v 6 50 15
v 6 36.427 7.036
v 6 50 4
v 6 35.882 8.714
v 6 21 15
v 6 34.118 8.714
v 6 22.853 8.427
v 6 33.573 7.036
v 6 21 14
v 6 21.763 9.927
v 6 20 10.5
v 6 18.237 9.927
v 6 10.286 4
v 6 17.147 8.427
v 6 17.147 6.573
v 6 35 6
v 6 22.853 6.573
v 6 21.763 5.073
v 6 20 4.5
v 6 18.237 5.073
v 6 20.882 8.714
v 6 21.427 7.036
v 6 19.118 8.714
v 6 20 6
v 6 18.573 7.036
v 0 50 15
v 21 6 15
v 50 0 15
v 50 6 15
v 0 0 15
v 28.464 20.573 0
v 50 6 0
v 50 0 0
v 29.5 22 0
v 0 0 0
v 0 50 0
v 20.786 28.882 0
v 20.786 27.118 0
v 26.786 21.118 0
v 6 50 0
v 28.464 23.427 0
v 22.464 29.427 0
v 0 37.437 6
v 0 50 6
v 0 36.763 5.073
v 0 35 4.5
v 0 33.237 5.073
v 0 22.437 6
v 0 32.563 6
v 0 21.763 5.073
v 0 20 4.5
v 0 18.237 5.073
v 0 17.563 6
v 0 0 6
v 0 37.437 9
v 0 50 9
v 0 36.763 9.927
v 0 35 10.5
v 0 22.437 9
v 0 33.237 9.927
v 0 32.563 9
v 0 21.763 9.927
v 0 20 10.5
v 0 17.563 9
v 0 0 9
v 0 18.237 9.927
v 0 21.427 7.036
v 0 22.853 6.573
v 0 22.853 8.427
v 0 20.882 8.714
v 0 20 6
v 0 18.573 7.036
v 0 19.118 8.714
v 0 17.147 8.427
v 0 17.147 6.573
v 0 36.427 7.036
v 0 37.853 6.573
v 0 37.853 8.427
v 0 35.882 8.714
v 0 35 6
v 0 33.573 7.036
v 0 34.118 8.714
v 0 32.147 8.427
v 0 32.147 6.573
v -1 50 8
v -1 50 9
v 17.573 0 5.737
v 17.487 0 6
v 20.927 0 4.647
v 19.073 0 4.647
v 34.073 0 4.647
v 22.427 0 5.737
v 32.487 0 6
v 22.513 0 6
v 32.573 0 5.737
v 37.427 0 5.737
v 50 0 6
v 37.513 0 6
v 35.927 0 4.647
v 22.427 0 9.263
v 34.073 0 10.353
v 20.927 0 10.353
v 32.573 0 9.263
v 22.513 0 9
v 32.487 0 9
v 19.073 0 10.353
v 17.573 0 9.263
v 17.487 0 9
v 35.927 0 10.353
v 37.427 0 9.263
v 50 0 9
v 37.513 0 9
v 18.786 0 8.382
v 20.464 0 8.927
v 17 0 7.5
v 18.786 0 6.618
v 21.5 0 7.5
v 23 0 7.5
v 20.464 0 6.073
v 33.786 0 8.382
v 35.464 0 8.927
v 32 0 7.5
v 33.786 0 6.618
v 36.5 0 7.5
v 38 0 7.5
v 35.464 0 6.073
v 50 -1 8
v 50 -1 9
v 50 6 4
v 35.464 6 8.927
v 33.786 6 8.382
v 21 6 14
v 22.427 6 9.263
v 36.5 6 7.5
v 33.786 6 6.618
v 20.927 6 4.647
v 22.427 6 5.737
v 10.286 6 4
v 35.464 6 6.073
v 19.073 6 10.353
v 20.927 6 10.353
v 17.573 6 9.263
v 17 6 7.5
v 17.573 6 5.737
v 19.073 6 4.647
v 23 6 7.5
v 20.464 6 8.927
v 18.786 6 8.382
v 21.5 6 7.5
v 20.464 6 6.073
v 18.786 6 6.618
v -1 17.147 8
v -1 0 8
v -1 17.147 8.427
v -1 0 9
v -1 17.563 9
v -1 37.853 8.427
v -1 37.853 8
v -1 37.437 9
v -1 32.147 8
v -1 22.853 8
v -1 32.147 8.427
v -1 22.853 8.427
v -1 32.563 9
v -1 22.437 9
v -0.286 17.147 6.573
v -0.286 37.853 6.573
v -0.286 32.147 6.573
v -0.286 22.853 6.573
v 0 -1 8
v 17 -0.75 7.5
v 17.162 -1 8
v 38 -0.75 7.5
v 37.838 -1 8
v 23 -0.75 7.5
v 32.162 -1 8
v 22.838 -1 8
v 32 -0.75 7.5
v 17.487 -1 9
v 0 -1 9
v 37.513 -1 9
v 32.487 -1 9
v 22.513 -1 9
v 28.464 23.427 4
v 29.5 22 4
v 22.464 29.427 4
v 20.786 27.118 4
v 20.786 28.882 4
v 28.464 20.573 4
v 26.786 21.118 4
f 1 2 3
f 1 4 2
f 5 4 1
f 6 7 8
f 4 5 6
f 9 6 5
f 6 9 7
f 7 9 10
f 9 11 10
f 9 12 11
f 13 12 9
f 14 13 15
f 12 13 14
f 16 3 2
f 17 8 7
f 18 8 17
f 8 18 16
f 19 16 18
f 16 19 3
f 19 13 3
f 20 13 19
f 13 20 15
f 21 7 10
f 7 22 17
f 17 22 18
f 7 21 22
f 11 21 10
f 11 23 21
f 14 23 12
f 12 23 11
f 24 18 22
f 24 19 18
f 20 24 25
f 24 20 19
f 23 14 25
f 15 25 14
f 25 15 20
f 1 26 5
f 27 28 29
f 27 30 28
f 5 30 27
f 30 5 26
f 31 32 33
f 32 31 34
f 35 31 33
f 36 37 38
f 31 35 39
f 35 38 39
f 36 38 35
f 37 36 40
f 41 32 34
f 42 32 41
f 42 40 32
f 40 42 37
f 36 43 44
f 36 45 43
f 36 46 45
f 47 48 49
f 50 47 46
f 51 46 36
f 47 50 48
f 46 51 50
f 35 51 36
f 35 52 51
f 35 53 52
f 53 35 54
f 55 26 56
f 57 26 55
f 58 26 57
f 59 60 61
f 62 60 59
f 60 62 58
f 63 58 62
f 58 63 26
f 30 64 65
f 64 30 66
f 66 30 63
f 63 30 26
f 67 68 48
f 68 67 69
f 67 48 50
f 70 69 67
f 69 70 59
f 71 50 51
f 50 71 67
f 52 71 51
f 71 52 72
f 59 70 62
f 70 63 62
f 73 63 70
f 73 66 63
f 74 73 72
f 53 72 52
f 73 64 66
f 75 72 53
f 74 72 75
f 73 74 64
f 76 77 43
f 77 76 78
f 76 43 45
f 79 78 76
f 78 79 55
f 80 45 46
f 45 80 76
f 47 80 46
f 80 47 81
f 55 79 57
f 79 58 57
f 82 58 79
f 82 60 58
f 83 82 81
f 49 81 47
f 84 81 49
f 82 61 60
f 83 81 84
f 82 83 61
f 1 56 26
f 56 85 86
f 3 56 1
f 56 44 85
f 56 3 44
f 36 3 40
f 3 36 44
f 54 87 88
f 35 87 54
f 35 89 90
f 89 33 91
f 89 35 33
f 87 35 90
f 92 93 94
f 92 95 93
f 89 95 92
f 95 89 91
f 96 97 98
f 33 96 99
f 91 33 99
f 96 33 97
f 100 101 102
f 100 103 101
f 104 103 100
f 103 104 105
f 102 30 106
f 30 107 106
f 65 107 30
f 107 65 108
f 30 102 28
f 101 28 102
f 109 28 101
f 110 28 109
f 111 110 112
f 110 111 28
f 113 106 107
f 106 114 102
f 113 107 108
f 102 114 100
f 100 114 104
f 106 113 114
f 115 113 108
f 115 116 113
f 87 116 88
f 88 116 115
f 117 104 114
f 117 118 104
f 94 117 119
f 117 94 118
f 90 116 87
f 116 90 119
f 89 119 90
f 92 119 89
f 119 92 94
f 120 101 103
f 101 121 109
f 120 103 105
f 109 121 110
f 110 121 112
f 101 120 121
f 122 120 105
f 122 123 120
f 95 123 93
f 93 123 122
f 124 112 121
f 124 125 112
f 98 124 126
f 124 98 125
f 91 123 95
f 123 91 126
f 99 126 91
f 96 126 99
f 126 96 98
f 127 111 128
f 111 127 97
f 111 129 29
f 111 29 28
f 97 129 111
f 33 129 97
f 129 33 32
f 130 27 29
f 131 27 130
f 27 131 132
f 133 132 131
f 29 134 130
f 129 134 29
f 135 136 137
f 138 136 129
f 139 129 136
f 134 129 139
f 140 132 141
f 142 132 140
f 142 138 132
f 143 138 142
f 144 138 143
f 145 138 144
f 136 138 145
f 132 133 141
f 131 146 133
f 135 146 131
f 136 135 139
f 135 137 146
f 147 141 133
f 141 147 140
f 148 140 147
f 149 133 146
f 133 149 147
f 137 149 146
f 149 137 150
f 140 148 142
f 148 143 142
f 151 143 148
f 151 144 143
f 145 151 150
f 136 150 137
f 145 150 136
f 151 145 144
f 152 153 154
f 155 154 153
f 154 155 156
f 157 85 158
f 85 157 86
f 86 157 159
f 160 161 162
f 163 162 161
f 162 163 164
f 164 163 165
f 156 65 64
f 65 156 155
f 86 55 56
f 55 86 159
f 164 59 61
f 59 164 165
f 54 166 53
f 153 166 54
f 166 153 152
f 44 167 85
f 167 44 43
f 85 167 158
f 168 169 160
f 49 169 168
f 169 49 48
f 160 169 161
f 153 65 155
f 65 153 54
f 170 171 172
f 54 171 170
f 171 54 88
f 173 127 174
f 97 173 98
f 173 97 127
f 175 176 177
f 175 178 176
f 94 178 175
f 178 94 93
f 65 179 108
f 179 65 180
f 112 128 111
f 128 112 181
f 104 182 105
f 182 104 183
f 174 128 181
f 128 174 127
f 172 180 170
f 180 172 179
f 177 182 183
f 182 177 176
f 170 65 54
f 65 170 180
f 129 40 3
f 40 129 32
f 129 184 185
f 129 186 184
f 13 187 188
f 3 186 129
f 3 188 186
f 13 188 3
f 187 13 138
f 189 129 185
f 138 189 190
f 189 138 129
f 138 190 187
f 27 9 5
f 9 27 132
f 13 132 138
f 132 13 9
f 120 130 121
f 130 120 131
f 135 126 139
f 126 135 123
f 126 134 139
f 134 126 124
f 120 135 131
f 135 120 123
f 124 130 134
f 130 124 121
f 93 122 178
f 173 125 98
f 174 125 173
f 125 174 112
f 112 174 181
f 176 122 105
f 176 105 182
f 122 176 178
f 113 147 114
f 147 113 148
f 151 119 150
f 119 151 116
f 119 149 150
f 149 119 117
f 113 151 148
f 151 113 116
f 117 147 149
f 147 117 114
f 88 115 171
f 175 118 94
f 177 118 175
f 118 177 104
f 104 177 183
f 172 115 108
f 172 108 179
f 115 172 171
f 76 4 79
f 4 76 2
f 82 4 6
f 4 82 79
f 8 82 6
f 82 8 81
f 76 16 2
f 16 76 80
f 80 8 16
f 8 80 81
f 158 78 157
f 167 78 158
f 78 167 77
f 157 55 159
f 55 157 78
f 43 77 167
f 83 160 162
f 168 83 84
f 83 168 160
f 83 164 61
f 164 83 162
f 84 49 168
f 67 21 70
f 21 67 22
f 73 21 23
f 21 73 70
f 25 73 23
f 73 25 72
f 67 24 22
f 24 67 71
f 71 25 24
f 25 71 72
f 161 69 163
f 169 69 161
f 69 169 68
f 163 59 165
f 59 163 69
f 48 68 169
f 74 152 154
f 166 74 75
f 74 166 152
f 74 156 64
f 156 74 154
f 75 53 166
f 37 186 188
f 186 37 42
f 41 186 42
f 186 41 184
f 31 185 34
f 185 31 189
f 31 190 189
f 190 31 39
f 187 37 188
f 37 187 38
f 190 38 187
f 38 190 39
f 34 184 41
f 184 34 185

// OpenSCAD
Length = 50;
Thickness = 6;
holeDiameter = 3;
Height = 15;



difference()
{
    union()
    {
        walls();
        lip();
        plate();
        brace();
    }
    holes();
    MountingSlot();
}




// slot lip
module lip()
{
    hull()
    {
        translate([-1, 0, Height/2 + .5]) cube ([1,Length,1]);
        translate([0, 0, Height/2 - 1.5]) cube ([1,Length,1]);
    }

    hull()
    {
        translate([ 0,-1, Height/2 + .5]) cube ([Length,1,1]);
        translate([0, 0, Height/2 - 1.5]) cube ([Length,1,1]);
    }
}


module MountingSlot()
{
hull()
{
 translate([Length/2+holeDiameter, Length/2-holeDiameter, 0]) 
      cylinder(d=holeDiameter, h=Thickness +1);
 translate([Length/2-holeDiameter, Length/2+holeDiameter, 0]) 
      cylinder(d=holeDiameter, h=Thickness +1);
}
}

// holes
module holes()
{
translate([Length-15, -.5, Height/2]) 
    rotate([-90,0,0]) 
        cylinder(d=holeDiameter, h=Thickness +1);
translate([Length-15, -Thickness, Height/2]) 
    rotate([-90,0,0]) 
        cylinder(r=holeDiameter, h=Thickness );

translate([Length-15-15, -.5, Height/2]) 
    rotate([-90,0,0]) 
        cylinder(d=holeDiameter, h=Thickness +1);
 translate([Length-15-15, Thickness, Height/2]) 
    rotate([-90,0,0]) 
        cylinder(r=holeDiameter, h=Thickness );
 translate([Length-15-15, -Thickness, Height/2]) 
    rotate([-90,0,0]) 
        cylinder(r=holeDiameter, h=Thickness );
     
  
    
translate([ -.5,Length-15, Height/2]) 
    rotate([0, 90, 0]) 
        cylinder(d=holeDiameter, h=Thickness +1);
translate([ -Thickness,Length-15, Height/2]) 
    rotate([0,90,0]) 
        cylinder(r=holeDiameter, h=Thickness );
    
translate([ -.5,Length-15-15, Height/2]) 
    rotate([0,90,0]) 
        cylinder(d=holeDiameter, h=Thickness +1);
translate([ Thickness,Length-15-15, Height/2]) 
    rotate([0,90,0]) 
        cylinder(r=holeDiameter, h=Thickness );
translate([ -Thickness,Length-15-15, Height/2]) 
    rotate([0,90,0]) 
        cylinder(r=holeDiameter, h=Thickness );
}



module walls()
{
//walls
cube ([Thickness,Length,Height]);
cube ([Length,Thickness,Height]);
}


//angle plate
module plate()
{
hull()
{
    cube ([Thickness,Length,4]);
    cube ([Length,Thickness,4]);
    cube ([1,15,4]);
}
}


// inner brace
module brace()
{
hull()
{
    translate([0,0,Height-1]) cube ([Thickness,Height+Thickness,1]);
    translate([0,0,Height-1]) cube ([Height+Thickness,Thickness,1]);
    cube ([Thickness,Thickness,Height]);
}   
}
